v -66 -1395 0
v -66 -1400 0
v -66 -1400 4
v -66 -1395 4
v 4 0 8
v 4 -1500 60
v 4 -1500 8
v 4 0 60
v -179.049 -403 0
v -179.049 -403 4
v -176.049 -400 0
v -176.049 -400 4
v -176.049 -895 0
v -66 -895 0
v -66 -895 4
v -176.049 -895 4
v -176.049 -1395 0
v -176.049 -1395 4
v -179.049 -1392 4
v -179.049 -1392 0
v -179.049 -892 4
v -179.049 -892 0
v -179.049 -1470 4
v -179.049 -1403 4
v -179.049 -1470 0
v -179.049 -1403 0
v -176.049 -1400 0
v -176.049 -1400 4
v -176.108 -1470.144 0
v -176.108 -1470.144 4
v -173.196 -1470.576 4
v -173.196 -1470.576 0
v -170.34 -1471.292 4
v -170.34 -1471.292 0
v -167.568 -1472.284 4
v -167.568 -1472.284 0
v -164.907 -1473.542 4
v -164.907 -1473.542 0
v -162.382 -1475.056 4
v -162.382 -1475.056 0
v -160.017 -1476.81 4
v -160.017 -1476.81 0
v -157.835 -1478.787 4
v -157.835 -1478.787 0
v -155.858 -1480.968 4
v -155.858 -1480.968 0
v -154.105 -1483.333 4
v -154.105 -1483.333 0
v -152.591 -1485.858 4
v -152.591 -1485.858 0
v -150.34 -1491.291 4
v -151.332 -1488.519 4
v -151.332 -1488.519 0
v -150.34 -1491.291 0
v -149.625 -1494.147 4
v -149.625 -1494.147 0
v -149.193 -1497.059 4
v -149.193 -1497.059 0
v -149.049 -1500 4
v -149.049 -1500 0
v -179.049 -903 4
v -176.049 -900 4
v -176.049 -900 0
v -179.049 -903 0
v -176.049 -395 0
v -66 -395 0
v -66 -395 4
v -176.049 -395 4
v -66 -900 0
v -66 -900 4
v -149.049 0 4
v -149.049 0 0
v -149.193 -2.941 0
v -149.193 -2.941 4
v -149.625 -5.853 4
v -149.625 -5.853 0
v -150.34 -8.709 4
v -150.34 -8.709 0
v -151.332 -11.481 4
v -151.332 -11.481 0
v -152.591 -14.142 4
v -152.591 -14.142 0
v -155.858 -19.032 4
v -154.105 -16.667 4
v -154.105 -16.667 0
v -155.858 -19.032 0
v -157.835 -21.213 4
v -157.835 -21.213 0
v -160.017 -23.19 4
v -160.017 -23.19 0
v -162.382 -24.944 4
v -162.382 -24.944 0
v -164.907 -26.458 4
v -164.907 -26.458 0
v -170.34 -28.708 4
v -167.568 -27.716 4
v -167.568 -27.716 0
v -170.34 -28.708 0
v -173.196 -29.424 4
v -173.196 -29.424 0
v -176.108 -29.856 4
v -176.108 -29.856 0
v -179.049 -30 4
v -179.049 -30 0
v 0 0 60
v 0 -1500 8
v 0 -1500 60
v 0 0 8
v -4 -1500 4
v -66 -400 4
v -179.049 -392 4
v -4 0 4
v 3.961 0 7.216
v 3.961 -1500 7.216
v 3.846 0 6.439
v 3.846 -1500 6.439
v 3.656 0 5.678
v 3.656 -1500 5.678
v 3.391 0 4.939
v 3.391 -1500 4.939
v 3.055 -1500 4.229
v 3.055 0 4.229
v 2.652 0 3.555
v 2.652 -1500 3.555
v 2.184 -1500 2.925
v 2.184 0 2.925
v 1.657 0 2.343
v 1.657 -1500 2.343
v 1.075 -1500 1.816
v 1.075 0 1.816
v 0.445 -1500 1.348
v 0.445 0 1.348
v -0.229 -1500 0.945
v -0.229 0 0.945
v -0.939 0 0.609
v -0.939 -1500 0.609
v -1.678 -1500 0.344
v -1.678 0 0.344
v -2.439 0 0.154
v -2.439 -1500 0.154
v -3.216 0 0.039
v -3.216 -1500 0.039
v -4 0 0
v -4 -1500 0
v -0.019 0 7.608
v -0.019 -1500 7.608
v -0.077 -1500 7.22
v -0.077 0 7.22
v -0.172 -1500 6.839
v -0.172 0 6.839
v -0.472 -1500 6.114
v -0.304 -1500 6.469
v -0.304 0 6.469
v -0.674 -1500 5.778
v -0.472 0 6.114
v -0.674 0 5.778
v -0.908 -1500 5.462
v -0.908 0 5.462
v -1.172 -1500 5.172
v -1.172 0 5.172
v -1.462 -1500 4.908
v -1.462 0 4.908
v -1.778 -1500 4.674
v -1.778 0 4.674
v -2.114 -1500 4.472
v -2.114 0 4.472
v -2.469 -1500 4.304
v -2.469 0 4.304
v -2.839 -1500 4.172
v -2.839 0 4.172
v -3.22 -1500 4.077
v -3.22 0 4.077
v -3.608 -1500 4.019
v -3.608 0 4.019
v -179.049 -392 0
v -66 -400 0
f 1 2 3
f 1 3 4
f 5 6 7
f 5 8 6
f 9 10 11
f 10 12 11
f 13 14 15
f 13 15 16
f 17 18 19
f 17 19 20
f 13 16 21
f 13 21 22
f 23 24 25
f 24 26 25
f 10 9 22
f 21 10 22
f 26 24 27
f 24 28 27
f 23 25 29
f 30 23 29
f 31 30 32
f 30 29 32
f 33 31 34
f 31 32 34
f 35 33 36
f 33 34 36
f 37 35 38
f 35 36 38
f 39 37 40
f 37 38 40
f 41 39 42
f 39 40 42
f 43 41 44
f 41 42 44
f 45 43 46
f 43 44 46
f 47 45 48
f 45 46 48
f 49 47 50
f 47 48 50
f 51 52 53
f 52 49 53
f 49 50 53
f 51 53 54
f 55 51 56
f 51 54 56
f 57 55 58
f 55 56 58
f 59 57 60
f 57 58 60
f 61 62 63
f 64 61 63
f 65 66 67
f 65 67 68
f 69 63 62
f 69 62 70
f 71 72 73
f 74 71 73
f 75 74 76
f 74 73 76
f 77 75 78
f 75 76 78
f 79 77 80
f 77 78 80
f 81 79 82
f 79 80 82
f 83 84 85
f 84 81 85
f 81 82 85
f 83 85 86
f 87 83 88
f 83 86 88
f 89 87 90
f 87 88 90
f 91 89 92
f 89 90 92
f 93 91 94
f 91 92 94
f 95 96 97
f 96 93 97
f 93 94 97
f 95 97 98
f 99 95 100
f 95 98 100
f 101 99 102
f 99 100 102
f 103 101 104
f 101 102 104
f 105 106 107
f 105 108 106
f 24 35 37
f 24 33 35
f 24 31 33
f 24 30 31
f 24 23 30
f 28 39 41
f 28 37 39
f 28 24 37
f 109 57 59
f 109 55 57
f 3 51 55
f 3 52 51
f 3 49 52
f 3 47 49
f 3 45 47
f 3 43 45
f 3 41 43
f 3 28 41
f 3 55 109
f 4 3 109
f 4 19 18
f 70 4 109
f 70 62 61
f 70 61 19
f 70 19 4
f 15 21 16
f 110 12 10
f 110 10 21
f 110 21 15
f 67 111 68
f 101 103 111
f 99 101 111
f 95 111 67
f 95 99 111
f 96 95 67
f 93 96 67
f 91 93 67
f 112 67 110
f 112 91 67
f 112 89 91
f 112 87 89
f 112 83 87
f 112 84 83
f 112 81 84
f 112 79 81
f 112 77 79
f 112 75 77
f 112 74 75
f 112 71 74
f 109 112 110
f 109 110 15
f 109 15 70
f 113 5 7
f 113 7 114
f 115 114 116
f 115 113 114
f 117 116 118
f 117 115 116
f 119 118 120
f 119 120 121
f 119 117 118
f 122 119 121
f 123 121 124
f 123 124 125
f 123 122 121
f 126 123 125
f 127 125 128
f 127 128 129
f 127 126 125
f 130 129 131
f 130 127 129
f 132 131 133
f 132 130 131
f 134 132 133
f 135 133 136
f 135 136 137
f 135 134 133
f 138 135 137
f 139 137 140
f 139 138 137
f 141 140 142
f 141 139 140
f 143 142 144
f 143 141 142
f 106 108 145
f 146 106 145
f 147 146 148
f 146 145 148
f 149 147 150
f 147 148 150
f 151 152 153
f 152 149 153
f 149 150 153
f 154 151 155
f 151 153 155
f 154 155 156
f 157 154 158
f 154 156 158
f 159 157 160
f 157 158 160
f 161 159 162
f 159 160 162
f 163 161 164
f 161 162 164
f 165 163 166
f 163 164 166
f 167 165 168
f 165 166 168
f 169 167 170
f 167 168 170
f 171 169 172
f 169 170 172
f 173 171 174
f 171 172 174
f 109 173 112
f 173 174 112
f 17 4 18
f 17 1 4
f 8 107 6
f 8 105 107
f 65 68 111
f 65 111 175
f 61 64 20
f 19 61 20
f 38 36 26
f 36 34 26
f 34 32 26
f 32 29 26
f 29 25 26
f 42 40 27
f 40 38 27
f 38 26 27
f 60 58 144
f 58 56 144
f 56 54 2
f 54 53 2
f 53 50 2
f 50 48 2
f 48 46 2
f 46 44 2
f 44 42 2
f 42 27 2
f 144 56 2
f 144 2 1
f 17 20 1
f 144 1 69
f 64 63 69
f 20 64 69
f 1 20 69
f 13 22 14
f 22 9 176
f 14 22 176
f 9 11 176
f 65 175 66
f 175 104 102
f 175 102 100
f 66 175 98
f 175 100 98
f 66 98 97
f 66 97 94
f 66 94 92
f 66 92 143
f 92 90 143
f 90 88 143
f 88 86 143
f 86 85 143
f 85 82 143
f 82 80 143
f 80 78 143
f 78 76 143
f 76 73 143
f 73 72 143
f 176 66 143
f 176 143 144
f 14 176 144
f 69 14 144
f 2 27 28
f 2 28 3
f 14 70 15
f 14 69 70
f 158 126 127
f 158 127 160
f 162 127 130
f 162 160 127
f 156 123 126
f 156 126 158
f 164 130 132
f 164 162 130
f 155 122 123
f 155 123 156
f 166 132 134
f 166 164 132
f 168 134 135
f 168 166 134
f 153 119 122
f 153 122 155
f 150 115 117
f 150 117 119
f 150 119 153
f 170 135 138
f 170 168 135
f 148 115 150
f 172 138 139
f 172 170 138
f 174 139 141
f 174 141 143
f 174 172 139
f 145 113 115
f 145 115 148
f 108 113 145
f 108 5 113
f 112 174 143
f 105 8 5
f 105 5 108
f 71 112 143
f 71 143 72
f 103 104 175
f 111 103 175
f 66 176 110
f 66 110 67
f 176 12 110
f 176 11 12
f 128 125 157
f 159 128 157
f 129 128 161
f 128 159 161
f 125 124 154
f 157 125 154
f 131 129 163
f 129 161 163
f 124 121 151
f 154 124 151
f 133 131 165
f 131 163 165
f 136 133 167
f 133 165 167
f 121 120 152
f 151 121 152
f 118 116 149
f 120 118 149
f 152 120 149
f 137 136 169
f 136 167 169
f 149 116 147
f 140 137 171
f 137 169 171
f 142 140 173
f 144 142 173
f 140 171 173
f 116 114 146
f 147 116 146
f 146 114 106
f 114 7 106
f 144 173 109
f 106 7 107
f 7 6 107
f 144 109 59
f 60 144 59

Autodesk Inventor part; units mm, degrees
ref_plane "YZ Plane" through (0, 0, 0) normal (1, 0, 0) x (0, 1, 0)
ref_plane "XZ Plane" through (0, 0, 0) normal (0, 1, 0) x (-1, 0, 0)
ref_plane "XY Plane" through (0, 0, 0) normal (0, 0, 1) x (1, 0, 0)
sketch "Sketch1" plane through (0, 0, 0) normal (0, 0, 1) x (1, 0, 0)
  line L0 (0, 0) -> (-179.0487, 0)
  line L1 (-179.0487, 0) -> (-179.0487, -1500)
  line L2 (-179.0487, -1500) -> (0, -1500)
  line L3 (0, -1500) -> (0, 0)
  line L4 (-179.0487, -1400) -> (-66, -1400)
  line L5 (-66, -1400) -> (-66, -1395)
  line L6 (-66, -1395) -> (-179.0487, -1395)
  line L7 (-179.0487, -1395) -> (-179.0487, -1400)
  line L8 (-179.0487, -900) -> (-66, -900)
  line L9 (-66, -900) -> (-66, -895)
  line L10 (-66, -895) -> (-179.0487, -895)
  line L11 (-179.0487, -895) -> (-179.0487, -900)
  line L12 (-179.0487, -400) -> (-66, -400)
  line L13 (-66, -400) -> (-66, -395)
  line L14 (-66, -395) -> (-179.0487, -395)
  line L15 (-179.0487, -395) -> (-179.0487, -400)
  circle A0 centre (-179.0487, 0) radius 30
  circle A1 centre (-179.0487, -1500) radius 30
  point P0 (-179.0487, -400)
  point P1 (-149.0487, 0)
  point P2 (-179.0487, -30)
  point P3 (-179.0487, -1470)
  point P4 (-149.0487, -1500)
  dimension "d0" = 1500
  dimension "d1" = 179.0487
  dimension "d2" = 5
  dimension "d4" = 100
  dimension "d7" = 500
  dimension "d23" = 66
  dimension "d24" = 60
extrude "Plate1" add sketch "Sketch1" along normal blind 4 contours L3 L2 A1 L1 L4 L5 L6 L8 L9 L10 L12 L13 L14 A0 L0
sketch "Sketch2" plane through (4, 0, 0) normal (-1, 0, 0) x (0, -1, 0)
  line L0 (1500, 0) -> (0, 0)
  line L1 (0, 0) -> (0, 60)
  line L2 (0, 60) -> (1500, 60)
  line L3 (1500, 60) -> (1500, 0)
edge flange "Flange1" height 60 angle 90 thickness 4 bend radius 4 thickness toward (-1, 0, 0) relief tear relief width 4 relief depth 2 edges at (0, -750, 4) wall of the first edge with corners at (4, -1500, 0) (4, 0, 0) (4, 0, 60) (4, -1500, 60)
bend "Bend1"
corner "Corner1"
chamfer "Corner Chamfer1" distance 3 angle 45 6 edges at (-179.0487, -1400, 2) (-179.0487, -1395, 2) (-179.0487, -900, 2) (-179.0487, -895, 2) (-179.0487, -395, 2) (-179.0487, -400, 2)
equation "\"d1\" = стрингер_глубина_2"
equation "\"d2\" = паз_под_стрингер_толщина"
equation "\"d23\" = паз_под_стрингер_глубина - Thickness"
equation "\"d24\" = 2 * радиус_выреза_под_сварку"
equation "\"d12\" = Thickness"
equation "\"d13\" = BendReliefWidth"
equation "\"d14\" = BendReliefDepth"
equation "\"d15\" = MinimumRemnant"
equation "\"d16\" = TransitionRadius"
equation "\"d17\" = ребро_усилителей"
equation "\"d19\" = BendRadius"
equation "\"d20\" = CornerReliefSize"
equation "\"d21\" = GapSize"
equation "\"d22\" = JacobiRadiusSize"
equation "\"BendRadius\" = Thickness"
equation "\"BendReliefWidth\" = Thickness"
equation "\"BendReliefDepth\" = 0.5 * Thickness"
equation "\"CornerReliefSize\" = 4 * Thickness"
equation "\"MinimumRemnant\" = 2 * Thickness"
equation "\"TransitionRadius\" = BendRadius"
equation "\"JacobiRadiusSize\" = BendRadius"
equation "\"GapSize\" = Thickness"
equation "\"стрингер_глубина_2\" = 179.048739"
equation "\"паз_под_стрингер_толщина\" = 5"
equation "\"паз_под_стрингер_глубина\" = 70"
equation "\"Thickness\" = 4"
equation "\"радиус_выреза_под_сварку\" = 30"
equation "\"ребро_усилителей\" = 60"
properties part number "0233 GBK stringer 3" material "Steel"
